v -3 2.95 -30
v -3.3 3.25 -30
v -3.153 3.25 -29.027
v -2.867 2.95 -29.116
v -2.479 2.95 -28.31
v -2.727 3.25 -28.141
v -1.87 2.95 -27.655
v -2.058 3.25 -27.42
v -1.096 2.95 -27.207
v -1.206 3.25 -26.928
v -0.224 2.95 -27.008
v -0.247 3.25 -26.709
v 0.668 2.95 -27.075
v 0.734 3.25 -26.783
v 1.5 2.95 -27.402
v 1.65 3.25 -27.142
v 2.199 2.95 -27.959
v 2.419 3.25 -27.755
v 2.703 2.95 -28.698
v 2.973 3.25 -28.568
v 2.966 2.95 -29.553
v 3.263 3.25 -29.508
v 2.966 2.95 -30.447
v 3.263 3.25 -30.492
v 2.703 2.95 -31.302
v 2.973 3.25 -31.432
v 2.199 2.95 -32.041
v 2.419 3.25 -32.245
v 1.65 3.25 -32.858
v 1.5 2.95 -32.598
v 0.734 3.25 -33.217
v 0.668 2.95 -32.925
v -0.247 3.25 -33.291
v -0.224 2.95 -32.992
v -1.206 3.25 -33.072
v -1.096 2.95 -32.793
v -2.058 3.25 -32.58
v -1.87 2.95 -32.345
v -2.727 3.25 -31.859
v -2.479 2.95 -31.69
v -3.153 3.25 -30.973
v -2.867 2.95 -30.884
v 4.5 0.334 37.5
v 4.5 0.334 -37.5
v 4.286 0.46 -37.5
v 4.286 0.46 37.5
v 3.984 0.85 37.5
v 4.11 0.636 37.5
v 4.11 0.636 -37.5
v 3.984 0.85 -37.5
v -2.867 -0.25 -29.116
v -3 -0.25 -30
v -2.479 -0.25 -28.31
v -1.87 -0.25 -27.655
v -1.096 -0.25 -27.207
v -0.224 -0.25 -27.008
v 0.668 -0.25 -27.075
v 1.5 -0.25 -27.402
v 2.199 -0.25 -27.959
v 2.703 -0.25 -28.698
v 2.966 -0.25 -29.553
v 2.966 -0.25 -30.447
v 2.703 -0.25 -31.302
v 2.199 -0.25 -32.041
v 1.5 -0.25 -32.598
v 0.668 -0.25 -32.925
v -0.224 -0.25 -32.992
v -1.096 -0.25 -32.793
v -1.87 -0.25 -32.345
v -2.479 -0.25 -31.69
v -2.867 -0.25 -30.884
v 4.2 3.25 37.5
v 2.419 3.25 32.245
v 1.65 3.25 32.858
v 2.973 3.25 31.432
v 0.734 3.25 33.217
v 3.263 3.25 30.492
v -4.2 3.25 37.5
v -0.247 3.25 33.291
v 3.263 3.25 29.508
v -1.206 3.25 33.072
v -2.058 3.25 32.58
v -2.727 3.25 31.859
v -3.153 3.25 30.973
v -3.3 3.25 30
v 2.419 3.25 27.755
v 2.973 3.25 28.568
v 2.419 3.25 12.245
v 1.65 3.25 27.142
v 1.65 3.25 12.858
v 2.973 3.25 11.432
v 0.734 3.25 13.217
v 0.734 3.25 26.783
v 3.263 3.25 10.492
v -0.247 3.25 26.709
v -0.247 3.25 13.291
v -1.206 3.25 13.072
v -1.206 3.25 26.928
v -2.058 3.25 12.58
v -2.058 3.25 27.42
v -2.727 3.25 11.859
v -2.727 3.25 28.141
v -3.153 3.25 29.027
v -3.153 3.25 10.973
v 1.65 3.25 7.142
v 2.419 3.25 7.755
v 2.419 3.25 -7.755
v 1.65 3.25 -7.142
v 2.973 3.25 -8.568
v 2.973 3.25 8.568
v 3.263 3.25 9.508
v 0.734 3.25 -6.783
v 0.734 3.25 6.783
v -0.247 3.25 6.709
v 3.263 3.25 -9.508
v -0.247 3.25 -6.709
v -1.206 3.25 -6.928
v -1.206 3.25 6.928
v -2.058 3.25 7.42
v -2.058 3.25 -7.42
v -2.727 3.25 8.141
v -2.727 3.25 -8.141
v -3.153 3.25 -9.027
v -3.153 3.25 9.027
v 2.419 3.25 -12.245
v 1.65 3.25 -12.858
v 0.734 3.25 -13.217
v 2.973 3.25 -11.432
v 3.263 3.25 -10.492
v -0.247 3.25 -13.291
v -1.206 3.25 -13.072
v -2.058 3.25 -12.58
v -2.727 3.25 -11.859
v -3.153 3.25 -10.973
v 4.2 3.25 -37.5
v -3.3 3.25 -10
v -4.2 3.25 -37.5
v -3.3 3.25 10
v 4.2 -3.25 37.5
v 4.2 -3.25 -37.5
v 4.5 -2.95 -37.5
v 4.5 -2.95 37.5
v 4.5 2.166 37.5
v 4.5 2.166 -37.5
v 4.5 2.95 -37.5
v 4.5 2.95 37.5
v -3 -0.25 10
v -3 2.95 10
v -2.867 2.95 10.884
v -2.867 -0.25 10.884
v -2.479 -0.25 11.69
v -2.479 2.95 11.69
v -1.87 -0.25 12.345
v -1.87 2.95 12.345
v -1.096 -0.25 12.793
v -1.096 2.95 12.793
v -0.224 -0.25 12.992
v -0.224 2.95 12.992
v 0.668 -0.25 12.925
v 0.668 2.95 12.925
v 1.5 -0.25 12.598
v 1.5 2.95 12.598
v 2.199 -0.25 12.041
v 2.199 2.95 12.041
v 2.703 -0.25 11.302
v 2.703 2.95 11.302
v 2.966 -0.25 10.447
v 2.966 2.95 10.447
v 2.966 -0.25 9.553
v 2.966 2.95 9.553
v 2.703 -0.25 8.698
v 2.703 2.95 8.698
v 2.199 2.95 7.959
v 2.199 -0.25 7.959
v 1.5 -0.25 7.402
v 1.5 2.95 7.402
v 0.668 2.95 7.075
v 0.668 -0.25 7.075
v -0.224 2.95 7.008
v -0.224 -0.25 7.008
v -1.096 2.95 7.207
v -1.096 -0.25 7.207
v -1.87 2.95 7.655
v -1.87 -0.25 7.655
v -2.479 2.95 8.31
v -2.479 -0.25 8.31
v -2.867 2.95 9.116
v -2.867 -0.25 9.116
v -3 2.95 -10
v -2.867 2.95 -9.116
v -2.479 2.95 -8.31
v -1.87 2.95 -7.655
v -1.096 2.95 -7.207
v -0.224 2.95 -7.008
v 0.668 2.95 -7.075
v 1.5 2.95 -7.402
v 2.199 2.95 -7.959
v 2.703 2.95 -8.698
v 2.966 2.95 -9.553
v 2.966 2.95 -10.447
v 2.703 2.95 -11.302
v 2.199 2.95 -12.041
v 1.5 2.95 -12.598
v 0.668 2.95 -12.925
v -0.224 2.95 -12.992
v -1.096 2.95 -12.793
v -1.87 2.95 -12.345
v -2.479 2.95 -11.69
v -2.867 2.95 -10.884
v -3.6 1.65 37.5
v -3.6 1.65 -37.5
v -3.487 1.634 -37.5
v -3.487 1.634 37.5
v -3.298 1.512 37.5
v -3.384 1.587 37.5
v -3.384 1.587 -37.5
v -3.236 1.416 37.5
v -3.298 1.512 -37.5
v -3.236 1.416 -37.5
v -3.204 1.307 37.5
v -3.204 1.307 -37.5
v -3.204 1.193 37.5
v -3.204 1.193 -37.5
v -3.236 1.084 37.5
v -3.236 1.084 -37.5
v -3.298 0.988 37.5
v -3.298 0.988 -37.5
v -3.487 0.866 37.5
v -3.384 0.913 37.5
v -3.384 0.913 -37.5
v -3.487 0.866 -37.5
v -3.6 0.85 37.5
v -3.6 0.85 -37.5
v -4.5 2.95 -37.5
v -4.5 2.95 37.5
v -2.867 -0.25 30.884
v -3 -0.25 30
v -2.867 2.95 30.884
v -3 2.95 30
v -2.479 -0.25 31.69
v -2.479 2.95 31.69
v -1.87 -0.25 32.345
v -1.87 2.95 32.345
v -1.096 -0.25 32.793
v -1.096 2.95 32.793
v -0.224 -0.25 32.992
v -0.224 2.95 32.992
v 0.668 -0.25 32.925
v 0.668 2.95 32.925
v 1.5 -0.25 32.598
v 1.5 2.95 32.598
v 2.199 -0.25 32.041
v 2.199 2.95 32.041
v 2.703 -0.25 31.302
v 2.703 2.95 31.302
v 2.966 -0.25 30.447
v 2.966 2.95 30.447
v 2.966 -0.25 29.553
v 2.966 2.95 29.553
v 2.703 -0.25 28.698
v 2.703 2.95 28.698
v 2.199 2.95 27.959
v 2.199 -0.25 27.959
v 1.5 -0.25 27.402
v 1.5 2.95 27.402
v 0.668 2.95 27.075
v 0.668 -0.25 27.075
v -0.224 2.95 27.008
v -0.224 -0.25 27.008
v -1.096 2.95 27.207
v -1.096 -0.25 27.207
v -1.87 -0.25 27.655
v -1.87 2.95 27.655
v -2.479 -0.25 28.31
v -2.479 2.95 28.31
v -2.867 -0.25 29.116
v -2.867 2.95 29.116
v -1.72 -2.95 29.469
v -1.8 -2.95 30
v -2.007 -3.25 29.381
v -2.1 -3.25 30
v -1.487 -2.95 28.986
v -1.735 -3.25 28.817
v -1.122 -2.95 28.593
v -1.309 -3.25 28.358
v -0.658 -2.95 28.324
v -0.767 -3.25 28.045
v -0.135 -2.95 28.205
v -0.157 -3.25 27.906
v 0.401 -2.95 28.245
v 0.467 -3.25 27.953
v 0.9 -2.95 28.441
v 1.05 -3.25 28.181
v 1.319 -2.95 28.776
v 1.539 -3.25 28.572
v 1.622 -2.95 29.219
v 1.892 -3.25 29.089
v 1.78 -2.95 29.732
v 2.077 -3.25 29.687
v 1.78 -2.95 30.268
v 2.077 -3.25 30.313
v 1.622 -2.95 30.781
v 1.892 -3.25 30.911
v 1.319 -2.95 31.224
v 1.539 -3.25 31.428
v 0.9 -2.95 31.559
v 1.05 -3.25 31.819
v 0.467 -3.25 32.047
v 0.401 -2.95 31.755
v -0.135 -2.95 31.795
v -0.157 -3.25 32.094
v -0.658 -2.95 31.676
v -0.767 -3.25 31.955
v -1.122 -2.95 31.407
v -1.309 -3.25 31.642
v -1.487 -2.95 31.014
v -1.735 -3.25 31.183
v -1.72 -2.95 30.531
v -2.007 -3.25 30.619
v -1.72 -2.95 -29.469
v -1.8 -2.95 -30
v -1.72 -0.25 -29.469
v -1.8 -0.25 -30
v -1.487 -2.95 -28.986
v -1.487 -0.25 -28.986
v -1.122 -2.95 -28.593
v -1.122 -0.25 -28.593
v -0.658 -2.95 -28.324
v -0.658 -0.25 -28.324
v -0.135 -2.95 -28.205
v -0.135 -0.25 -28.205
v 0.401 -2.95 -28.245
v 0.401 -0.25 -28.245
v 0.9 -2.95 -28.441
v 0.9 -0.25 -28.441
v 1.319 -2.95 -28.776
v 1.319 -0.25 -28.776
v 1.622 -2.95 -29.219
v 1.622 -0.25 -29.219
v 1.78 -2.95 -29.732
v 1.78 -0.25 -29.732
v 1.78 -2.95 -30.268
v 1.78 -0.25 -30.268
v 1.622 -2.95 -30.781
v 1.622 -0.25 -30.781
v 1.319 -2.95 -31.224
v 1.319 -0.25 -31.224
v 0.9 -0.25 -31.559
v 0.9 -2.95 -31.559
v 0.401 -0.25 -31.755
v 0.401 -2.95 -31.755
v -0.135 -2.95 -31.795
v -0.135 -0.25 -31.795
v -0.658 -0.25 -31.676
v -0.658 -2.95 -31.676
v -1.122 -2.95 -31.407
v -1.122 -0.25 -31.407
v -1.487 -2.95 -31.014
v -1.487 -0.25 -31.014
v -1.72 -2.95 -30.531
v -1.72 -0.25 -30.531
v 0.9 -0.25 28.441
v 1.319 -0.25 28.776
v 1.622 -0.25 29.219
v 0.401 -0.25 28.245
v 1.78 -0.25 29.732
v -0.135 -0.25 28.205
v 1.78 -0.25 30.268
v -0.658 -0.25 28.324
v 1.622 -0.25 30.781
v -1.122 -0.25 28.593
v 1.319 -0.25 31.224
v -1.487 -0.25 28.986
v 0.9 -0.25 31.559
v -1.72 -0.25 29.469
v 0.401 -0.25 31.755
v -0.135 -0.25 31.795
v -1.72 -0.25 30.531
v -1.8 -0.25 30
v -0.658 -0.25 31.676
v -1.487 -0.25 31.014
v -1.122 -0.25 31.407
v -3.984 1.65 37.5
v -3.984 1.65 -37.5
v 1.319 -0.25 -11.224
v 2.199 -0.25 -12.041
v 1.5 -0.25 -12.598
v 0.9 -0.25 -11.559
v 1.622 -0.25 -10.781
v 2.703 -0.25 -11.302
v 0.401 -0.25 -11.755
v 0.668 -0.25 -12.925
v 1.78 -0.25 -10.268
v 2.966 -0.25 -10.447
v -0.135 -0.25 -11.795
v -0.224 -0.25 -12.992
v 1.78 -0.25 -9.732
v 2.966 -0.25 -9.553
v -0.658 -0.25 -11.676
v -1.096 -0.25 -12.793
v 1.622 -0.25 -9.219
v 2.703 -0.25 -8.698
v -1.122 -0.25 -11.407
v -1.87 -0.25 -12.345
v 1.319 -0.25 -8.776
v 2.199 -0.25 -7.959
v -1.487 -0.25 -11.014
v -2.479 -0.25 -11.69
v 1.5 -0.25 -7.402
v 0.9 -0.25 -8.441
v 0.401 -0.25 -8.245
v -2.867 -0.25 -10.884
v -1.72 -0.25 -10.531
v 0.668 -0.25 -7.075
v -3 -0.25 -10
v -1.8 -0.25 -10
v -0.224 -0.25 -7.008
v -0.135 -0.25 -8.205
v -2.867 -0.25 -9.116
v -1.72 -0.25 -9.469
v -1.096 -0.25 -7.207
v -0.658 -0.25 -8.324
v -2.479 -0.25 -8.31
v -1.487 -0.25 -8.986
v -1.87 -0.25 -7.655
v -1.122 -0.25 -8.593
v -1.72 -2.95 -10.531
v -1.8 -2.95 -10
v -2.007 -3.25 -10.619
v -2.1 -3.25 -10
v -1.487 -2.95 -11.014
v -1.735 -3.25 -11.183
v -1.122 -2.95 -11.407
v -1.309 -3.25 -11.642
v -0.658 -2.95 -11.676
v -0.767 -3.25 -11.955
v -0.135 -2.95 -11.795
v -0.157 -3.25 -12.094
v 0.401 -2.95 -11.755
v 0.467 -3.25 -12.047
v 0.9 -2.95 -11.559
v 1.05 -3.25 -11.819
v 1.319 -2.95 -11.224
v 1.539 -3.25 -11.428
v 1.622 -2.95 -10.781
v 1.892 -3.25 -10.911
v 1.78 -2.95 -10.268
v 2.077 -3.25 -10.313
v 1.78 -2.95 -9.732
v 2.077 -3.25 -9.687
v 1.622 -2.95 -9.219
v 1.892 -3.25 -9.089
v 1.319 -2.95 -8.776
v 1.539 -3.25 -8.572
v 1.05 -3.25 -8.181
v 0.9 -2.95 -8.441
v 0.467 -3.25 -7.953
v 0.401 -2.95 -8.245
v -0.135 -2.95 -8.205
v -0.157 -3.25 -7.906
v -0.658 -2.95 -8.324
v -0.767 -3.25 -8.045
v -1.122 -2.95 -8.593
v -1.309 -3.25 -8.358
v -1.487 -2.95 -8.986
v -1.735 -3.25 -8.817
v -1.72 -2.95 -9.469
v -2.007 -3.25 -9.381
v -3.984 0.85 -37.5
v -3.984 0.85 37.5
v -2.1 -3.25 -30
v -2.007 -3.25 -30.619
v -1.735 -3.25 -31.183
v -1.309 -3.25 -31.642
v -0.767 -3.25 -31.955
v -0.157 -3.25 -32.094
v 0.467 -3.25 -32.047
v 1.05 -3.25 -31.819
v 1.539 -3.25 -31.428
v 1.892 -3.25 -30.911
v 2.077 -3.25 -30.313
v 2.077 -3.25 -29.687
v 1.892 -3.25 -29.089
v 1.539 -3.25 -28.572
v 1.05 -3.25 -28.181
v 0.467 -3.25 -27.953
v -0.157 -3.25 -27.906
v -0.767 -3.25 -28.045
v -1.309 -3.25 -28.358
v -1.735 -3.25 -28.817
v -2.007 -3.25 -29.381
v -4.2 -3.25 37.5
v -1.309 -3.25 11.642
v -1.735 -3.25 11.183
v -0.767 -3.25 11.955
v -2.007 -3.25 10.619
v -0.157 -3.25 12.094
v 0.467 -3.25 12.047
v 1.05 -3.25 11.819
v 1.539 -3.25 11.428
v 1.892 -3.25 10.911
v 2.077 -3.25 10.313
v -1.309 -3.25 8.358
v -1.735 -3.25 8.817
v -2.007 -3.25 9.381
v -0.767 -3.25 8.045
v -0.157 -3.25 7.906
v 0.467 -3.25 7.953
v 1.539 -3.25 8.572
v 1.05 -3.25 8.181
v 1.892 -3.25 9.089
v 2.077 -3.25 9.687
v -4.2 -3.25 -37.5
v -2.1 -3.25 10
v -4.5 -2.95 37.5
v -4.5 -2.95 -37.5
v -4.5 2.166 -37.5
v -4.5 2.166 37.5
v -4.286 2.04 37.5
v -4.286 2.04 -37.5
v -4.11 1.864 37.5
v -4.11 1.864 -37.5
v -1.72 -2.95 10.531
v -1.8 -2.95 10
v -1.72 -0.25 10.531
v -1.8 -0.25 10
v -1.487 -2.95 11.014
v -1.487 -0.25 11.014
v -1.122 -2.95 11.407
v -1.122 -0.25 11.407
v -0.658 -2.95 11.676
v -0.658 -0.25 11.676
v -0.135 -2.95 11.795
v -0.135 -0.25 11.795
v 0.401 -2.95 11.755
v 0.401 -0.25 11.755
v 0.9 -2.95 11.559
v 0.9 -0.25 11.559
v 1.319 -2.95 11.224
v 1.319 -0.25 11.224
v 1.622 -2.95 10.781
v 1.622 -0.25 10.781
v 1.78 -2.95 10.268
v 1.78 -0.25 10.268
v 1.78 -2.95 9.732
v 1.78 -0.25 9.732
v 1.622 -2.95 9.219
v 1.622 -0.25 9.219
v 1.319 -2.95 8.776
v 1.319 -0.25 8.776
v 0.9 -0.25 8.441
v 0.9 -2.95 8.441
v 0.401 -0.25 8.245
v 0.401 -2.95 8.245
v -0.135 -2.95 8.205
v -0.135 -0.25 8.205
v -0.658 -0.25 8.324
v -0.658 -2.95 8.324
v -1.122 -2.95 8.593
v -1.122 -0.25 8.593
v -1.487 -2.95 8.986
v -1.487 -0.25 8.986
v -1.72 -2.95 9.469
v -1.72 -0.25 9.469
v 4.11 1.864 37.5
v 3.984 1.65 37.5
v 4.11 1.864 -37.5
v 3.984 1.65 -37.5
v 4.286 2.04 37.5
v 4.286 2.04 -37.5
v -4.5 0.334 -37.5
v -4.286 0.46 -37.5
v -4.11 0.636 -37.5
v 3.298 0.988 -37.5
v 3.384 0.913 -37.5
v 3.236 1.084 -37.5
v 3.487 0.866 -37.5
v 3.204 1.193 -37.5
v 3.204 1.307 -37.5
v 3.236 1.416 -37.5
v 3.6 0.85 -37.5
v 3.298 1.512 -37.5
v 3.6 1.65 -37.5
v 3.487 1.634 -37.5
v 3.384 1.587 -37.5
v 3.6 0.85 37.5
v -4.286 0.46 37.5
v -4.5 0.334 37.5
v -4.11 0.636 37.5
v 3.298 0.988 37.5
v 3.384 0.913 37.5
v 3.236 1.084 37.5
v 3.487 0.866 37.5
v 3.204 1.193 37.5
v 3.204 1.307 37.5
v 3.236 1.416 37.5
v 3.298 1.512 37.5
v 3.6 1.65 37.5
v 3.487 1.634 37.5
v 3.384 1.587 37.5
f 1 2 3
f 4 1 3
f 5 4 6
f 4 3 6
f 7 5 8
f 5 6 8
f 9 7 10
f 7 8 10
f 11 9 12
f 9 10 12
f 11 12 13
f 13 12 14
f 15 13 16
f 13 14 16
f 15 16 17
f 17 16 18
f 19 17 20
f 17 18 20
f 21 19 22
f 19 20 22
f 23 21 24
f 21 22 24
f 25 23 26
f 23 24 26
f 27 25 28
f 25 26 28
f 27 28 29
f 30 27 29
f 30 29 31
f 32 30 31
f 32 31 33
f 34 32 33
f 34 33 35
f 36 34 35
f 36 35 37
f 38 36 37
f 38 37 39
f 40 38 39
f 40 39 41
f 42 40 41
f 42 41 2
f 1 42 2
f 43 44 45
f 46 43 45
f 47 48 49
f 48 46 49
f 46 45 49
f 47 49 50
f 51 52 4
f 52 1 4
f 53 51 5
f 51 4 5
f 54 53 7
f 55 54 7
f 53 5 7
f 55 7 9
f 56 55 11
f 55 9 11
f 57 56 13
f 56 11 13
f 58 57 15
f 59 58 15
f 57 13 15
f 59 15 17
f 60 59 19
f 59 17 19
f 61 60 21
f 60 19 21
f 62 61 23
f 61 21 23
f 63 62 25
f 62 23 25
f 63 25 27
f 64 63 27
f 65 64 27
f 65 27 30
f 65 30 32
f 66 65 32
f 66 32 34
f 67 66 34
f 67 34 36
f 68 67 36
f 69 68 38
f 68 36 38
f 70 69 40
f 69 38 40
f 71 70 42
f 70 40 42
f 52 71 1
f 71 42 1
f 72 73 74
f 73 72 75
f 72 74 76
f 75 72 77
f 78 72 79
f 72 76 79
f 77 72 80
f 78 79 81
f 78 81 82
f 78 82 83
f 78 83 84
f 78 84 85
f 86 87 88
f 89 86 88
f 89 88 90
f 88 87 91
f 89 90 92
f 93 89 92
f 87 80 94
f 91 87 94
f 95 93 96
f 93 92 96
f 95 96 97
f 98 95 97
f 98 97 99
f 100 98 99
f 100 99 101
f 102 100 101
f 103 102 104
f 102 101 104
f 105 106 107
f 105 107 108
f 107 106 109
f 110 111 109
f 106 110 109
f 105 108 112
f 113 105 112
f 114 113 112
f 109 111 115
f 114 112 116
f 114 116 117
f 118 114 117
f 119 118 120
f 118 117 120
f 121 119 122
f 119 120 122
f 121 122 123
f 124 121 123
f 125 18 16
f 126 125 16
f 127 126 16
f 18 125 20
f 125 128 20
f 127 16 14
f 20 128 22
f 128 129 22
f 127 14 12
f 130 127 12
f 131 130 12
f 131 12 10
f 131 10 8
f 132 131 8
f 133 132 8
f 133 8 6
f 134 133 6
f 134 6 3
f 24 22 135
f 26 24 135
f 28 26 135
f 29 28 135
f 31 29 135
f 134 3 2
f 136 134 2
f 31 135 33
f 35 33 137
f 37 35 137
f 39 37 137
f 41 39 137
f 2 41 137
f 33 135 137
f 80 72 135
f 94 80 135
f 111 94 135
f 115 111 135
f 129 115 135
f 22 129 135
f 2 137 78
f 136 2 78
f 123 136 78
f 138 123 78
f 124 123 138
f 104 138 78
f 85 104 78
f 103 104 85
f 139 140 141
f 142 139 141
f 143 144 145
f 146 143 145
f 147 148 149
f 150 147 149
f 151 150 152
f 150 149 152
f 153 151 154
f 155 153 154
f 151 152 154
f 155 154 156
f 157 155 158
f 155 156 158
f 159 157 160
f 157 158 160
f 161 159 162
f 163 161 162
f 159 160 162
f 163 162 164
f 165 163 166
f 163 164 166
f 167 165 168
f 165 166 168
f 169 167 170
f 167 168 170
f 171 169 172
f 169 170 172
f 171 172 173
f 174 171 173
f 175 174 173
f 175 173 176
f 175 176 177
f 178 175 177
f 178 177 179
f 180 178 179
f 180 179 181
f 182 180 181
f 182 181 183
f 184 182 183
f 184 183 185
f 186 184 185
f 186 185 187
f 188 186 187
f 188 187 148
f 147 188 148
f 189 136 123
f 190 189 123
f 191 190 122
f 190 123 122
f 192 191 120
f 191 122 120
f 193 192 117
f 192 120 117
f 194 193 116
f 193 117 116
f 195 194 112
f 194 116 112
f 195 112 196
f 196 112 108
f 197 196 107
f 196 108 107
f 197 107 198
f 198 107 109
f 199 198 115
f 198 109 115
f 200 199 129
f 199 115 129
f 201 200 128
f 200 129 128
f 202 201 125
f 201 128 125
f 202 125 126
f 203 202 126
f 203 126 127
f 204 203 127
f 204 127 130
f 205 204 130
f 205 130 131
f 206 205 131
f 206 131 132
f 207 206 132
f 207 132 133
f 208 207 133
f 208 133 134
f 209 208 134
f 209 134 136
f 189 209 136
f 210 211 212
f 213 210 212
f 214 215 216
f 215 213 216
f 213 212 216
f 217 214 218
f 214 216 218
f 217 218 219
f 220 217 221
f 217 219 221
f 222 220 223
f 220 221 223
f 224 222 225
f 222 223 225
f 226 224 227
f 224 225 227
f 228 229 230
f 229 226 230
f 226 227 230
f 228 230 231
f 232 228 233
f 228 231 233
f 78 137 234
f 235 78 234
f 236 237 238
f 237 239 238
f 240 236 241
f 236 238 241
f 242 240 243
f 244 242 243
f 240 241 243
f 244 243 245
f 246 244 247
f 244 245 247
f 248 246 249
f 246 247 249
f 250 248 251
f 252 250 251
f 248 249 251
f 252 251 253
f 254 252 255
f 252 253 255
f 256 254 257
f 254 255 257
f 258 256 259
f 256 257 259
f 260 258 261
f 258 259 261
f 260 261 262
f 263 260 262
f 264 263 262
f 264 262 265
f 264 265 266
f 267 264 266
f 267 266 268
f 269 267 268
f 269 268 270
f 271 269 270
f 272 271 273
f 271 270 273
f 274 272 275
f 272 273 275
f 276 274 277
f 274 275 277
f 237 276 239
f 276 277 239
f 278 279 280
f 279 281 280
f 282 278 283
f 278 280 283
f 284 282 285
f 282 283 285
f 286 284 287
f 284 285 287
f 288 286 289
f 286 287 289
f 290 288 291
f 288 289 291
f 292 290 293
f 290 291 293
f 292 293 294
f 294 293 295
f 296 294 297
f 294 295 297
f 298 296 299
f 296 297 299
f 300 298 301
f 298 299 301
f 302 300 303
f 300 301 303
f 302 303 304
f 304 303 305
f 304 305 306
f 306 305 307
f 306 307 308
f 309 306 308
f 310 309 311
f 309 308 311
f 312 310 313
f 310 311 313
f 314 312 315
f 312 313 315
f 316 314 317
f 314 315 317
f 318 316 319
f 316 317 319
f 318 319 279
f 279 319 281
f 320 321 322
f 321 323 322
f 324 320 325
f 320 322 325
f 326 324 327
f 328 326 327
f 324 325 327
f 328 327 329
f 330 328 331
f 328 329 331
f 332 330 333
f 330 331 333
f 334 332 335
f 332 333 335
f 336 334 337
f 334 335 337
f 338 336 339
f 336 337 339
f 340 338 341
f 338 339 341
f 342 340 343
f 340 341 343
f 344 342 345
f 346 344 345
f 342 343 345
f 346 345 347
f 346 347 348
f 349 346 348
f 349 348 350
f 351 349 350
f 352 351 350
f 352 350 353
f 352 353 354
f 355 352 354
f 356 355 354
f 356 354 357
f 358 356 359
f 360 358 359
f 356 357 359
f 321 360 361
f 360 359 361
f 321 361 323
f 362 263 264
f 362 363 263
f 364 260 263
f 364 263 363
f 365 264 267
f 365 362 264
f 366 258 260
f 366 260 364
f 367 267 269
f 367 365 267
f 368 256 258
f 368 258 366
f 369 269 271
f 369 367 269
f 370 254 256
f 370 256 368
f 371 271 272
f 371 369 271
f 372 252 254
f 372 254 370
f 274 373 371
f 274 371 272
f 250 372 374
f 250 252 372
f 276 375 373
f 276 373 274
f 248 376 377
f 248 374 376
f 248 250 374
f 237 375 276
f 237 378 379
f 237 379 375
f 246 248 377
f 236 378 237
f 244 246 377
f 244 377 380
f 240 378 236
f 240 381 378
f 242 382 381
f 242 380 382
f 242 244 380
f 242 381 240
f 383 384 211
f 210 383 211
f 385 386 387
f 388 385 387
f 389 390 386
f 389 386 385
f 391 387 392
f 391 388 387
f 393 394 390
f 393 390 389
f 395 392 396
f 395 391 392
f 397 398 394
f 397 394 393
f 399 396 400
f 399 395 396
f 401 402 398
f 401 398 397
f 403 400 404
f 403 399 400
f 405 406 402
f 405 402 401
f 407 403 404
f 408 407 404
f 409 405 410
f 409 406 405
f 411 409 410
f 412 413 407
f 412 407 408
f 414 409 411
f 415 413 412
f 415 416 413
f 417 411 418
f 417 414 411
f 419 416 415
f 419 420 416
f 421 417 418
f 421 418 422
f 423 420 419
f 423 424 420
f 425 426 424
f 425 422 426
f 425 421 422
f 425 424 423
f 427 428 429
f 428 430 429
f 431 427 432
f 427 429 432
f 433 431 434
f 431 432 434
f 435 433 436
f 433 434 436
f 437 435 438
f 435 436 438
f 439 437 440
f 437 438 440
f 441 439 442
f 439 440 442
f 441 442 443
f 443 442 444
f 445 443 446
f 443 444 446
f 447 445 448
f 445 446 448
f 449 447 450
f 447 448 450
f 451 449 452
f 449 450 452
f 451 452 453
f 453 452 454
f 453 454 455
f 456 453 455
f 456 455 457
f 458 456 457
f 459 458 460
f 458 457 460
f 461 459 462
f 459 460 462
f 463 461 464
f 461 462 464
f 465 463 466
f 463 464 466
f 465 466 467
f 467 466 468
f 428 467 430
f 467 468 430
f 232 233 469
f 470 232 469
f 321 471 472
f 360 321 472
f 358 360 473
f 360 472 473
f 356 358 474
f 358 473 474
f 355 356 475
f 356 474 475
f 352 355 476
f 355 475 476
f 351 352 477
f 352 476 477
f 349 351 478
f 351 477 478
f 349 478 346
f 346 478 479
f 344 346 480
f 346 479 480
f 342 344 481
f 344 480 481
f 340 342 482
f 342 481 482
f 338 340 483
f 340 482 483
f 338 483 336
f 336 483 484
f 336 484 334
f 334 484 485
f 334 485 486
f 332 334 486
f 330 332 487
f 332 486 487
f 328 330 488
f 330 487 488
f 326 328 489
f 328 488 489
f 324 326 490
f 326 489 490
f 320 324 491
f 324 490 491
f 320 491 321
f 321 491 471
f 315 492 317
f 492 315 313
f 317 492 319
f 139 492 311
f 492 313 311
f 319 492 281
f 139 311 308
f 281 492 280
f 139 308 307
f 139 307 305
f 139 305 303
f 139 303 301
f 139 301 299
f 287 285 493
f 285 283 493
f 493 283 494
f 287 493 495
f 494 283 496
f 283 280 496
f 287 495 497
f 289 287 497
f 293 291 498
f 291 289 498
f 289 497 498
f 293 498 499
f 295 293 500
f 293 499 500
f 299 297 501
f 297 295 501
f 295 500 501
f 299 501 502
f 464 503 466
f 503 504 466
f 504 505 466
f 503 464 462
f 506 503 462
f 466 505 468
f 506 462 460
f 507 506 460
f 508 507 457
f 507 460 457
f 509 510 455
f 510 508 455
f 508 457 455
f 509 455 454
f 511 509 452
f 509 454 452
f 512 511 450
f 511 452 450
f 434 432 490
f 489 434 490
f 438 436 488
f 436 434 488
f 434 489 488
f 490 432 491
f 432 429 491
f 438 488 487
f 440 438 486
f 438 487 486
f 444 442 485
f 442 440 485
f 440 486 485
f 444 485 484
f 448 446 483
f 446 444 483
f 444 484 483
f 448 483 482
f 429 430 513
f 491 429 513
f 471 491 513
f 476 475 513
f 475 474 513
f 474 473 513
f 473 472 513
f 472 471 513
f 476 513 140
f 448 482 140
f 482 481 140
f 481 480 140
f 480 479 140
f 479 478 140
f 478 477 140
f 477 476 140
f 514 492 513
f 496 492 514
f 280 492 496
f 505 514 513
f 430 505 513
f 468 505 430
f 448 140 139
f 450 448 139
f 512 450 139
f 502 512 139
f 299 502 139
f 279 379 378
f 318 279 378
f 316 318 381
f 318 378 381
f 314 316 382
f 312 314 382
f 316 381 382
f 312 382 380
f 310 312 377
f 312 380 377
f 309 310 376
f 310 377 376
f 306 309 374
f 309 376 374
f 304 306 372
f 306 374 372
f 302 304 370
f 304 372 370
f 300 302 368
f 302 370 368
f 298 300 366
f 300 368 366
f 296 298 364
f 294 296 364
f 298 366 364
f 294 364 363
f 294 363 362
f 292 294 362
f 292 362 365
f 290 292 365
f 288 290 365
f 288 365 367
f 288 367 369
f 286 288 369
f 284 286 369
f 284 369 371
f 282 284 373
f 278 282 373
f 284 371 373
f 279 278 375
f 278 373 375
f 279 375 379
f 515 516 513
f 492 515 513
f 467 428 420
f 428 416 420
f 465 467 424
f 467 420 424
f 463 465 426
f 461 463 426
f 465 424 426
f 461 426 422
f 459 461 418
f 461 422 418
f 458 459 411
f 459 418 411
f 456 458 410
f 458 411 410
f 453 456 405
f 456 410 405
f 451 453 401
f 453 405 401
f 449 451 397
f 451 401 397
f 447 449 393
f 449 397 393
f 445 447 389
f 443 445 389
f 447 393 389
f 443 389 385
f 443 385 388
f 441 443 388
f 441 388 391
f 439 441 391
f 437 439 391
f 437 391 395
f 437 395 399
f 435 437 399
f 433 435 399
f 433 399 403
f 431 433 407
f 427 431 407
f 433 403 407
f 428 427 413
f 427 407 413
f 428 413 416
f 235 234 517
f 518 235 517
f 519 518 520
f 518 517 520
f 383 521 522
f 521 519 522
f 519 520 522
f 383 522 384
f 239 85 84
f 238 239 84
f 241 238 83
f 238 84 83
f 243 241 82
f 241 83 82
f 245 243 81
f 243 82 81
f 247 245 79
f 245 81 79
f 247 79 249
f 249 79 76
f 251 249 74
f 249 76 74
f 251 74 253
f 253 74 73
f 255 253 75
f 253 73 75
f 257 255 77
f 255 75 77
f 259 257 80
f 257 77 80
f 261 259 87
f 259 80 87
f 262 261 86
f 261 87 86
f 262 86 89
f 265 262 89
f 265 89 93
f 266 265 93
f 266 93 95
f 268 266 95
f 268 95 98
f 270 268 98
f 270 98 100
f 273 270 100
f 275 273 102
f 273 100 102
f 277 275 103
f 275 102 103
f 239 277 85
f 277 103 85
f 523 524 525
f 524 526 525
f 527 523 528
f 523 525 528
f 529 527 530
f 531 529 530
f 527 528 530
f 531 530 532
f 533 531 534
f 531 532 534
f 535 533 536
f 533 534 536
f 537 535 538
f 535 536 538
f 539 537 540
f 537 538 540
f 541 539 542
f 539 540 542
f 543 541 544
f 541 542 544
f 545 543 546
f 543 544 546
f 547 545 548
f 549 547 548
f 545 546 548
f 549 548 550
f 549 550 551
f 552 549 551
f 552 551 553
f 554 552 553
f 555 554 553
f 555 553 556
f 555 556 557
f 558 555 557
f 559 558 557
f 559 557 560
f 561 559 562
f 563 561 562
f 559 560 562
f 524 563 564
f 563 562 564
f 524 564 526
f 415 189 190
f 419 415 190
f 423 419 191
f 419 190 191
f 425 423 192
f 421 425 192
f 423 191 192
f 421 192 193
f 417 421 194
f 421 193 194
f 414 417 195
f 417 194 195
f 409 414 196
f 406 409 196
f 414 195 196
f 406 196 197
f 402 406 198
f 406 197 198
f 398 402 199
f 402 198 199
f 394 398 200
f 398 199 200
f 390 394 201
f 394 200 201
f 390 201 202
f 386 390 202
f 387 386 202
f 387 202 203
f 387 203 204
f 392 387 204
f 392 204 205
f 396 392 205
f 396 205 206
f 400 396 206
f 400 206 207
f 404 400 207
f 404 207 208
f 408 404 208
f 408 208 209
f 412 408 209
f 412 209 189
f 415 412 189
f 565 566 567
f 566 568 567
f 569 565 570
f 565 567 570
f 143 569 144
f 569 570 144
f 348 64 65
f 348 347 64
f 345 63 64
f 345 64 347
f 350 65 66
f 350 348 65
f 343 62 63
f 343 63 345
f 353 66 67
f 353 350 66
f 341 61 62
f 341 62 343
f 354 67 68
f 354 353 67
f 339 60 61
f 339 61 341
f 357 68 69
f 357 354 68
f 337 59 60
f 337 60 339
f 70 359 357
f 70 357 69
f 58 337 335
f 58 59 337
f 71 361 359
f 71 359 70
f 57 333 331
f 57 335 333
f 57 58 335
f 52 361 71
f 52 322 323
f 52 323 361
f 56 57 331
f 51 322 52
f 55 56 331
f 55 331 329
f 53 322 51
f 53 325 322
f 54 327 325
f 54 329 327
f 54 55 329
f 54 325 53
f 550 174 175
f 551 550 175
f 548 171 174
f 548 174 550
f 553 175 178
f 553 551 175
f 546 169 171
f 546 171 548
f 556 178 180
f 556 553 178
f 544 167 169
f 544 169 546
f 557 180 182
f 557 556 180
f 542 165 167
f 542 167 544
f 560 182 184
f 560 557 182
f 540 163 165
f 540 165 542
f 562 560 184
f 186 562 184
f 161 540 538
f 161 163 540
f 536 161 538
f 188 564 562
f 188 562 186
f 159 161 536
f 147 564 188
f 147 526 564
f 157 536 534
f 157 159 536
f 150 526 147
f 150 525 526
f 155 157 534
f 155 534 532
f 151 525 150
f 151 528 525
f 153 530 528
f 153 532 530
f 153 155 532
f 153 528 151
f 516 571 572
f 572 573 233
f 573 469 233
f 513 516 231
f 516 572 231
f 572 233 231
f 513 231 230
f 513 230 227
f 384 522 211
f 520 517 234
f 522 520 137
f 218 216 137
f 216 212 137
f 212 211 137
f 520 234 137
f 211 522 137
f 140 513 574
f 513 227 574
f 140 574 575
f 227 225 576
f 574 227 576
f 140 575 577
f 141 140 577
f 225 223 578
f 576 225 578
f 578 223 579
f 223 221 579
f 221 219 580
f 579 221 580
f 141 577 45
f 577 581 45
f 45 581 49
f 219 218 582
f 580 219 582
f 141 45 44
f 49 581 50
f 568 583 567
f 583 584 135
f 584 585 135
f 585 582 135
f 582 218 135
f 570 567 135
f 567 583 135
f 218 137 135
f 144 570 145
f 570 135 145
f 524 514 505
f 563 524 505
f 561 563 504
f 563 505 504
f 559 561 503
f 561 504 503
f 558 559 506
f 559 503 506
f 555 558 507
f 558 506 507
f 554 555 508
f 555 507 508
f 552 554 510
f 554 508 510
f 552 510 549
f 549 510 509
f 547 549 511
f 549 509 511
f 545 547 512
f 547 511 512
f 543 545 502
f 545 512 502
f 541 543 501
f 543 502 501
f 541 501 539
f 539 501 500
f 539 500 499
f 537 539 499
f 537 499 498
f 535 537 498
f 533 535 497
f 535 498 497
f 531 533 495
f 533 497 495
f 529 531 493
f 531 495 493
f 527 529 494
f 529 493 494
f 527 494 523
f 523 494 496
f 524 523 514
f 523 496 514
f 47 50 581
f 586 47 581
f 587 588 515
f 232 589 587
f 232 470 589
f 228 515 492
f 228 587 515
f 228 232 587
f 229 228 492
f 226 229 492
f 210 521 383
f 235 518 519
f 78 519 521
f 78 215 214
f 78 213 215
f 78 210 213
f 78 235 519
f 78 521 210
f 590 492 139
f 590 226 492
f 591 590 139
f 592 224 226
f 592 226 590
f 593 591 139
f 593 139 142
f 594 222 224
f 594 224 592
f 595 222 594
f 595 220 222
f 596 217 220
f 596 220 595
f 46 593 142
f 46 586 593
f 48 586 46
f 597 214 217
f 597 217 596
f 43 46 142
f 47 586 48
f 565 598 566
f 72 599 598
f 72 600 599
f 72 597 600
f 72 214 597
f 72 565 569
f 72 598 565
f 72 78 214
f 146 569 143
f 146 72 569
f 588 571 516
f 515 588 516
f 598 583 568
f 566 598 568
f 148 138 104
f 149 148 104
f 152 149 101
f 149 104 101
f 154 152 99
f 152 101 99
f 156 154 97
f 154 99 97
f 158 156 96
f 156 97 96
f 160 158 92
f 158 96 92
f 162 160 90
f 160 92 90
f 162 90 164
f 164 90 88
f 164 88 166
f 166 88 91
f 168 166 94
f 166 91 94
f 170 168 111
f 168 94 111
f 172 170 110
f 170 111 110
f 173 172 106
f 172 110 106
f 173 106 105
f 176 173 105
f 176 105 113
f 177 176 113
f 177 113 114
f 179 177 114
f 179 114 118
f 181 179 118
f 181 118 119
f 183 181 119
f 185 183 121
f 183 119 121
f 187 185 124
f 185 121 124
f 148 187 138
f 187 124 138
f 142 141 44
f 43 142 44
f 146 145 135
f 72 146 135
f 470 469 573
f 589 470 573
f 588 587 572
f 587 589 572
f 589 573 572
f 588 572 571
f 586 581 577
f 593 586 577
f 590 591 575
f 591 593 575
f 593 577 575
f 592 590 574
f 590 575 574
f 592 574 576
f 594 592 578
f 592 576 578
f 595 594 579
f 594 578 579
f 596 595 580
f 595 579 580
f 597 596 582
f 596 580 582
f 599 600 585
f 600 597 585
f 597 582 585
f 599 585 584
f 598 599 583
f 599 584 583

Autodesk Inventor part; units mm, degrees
sketch "_____1" plane through (0, 0, 0) normal (0, 0, 1) x (1, 0, 0)
  line L0 (-4.5, 2.95) -> (-4.5, 2.1665)
  arc A0 (-3.9835, 1.65) -> (-4.5, 2.1665) centre (-4.9, 1.25) ccw
  line L1 (-3.9835, 1.65) -> (-3.6, 1.65)
  arc A1 (-3.6, 0.85) -> (-3.6, 1.65) centre (-3.6, 1.25) ccw
  line L2 (-3.6, 0.85) -> (-3.9835, 0.85)
  arc A2 (-4.5, 0.3335) -> (-3.9835, 0.85) centre (-4.9, 1.25) ccw
  line L3 (-4.5, 0.3335) -> (-4.5, -2.95)
  line L4 (-4.5, -2.95) -> (-4.2, -3.25)
  line L5 (-4.2, -3.25) -> (4.2, -3.25)
  line L6 (4.2, -3.25) -> (4.5, -2.95)
  line L7 (4.5, -2.95) -> (4.5, 0.3335)
  arc A3 (3.9835, 0.85) -> (4.5, 0.3335) centre (4.9, 1.25) ccw
  line L8 (3.9835, 0.85) -> (3.6, 0.85)
  arc A4 (3.6, 1.65) -> (3.6, 0.85) centre (3.6, 1.25) ccw
  line L9 (3.6, 1.65) -> (3.9835, 1.65)
  arc A5 (4.5, 2.1665) -> (3.9835, 1.65) centre (4.9, 1.25) ccw
  line L10 (4.5, 2.1665) -> (4.5, 2.95)
  line L11 (4.5, 2.95) -> (4.2, 3.25)
  line L12 (4.2, 3.25) -> (-4.2, 3.25)
  line L13 (-4.2, 3.25) -> (-4.5, 2.95)
extrude "Extrusion1" add sketch "_____1" along normal mid plane 75
sketch "_____5" plane through (0, 0, 30) normal (0, 0, 1) x (1, 0, 0)
  line L0 (0, 3.25) -> (0, -3.25)
  line L1 (0, -3.25) -> (-2.1, -3.25)
  line L2 (-2.1, -3.25) -> (-1.8, -2.95)
  line L3 (-1.8, -2.95) -> (-1.8, -0.25)
  line L4 (-1.8, -0.25) -> (-3, -0.25)
  line L5 (-3, -0.25) -> (-3, 2.95)
  line L6 (-3, 2.95) -> (-3.3, 3.25)
  line L7 (-3.3, 3.25) -> (0, 3.25)
  line L8 (0, 3.25) -> (0, -3.25)
revolve "Revolution1" cut sketch "_____5" angle 360 about axis through (0, 3.25, 30) along (0, 1, 0)
pattern_linear "Rectangular Pattern1" count 4 spacing 20 along (0, 0, -1) of "Revolution1"
ref_plane "to_block1_XY" through (0, -3.25, 0) normal (0, 0, 1) x (1, 0, 0)
ref_plane "to_block1_YZ" through (0, -3.25, 0) normal (1, 0, 0) x (0, 1, 0)
ref_plane "to_block1_ZX" through (0, -3.25, 0) normal (0, 1, 0) x (0, 0, 1)
properties part number "C-MLG9-75_r"
